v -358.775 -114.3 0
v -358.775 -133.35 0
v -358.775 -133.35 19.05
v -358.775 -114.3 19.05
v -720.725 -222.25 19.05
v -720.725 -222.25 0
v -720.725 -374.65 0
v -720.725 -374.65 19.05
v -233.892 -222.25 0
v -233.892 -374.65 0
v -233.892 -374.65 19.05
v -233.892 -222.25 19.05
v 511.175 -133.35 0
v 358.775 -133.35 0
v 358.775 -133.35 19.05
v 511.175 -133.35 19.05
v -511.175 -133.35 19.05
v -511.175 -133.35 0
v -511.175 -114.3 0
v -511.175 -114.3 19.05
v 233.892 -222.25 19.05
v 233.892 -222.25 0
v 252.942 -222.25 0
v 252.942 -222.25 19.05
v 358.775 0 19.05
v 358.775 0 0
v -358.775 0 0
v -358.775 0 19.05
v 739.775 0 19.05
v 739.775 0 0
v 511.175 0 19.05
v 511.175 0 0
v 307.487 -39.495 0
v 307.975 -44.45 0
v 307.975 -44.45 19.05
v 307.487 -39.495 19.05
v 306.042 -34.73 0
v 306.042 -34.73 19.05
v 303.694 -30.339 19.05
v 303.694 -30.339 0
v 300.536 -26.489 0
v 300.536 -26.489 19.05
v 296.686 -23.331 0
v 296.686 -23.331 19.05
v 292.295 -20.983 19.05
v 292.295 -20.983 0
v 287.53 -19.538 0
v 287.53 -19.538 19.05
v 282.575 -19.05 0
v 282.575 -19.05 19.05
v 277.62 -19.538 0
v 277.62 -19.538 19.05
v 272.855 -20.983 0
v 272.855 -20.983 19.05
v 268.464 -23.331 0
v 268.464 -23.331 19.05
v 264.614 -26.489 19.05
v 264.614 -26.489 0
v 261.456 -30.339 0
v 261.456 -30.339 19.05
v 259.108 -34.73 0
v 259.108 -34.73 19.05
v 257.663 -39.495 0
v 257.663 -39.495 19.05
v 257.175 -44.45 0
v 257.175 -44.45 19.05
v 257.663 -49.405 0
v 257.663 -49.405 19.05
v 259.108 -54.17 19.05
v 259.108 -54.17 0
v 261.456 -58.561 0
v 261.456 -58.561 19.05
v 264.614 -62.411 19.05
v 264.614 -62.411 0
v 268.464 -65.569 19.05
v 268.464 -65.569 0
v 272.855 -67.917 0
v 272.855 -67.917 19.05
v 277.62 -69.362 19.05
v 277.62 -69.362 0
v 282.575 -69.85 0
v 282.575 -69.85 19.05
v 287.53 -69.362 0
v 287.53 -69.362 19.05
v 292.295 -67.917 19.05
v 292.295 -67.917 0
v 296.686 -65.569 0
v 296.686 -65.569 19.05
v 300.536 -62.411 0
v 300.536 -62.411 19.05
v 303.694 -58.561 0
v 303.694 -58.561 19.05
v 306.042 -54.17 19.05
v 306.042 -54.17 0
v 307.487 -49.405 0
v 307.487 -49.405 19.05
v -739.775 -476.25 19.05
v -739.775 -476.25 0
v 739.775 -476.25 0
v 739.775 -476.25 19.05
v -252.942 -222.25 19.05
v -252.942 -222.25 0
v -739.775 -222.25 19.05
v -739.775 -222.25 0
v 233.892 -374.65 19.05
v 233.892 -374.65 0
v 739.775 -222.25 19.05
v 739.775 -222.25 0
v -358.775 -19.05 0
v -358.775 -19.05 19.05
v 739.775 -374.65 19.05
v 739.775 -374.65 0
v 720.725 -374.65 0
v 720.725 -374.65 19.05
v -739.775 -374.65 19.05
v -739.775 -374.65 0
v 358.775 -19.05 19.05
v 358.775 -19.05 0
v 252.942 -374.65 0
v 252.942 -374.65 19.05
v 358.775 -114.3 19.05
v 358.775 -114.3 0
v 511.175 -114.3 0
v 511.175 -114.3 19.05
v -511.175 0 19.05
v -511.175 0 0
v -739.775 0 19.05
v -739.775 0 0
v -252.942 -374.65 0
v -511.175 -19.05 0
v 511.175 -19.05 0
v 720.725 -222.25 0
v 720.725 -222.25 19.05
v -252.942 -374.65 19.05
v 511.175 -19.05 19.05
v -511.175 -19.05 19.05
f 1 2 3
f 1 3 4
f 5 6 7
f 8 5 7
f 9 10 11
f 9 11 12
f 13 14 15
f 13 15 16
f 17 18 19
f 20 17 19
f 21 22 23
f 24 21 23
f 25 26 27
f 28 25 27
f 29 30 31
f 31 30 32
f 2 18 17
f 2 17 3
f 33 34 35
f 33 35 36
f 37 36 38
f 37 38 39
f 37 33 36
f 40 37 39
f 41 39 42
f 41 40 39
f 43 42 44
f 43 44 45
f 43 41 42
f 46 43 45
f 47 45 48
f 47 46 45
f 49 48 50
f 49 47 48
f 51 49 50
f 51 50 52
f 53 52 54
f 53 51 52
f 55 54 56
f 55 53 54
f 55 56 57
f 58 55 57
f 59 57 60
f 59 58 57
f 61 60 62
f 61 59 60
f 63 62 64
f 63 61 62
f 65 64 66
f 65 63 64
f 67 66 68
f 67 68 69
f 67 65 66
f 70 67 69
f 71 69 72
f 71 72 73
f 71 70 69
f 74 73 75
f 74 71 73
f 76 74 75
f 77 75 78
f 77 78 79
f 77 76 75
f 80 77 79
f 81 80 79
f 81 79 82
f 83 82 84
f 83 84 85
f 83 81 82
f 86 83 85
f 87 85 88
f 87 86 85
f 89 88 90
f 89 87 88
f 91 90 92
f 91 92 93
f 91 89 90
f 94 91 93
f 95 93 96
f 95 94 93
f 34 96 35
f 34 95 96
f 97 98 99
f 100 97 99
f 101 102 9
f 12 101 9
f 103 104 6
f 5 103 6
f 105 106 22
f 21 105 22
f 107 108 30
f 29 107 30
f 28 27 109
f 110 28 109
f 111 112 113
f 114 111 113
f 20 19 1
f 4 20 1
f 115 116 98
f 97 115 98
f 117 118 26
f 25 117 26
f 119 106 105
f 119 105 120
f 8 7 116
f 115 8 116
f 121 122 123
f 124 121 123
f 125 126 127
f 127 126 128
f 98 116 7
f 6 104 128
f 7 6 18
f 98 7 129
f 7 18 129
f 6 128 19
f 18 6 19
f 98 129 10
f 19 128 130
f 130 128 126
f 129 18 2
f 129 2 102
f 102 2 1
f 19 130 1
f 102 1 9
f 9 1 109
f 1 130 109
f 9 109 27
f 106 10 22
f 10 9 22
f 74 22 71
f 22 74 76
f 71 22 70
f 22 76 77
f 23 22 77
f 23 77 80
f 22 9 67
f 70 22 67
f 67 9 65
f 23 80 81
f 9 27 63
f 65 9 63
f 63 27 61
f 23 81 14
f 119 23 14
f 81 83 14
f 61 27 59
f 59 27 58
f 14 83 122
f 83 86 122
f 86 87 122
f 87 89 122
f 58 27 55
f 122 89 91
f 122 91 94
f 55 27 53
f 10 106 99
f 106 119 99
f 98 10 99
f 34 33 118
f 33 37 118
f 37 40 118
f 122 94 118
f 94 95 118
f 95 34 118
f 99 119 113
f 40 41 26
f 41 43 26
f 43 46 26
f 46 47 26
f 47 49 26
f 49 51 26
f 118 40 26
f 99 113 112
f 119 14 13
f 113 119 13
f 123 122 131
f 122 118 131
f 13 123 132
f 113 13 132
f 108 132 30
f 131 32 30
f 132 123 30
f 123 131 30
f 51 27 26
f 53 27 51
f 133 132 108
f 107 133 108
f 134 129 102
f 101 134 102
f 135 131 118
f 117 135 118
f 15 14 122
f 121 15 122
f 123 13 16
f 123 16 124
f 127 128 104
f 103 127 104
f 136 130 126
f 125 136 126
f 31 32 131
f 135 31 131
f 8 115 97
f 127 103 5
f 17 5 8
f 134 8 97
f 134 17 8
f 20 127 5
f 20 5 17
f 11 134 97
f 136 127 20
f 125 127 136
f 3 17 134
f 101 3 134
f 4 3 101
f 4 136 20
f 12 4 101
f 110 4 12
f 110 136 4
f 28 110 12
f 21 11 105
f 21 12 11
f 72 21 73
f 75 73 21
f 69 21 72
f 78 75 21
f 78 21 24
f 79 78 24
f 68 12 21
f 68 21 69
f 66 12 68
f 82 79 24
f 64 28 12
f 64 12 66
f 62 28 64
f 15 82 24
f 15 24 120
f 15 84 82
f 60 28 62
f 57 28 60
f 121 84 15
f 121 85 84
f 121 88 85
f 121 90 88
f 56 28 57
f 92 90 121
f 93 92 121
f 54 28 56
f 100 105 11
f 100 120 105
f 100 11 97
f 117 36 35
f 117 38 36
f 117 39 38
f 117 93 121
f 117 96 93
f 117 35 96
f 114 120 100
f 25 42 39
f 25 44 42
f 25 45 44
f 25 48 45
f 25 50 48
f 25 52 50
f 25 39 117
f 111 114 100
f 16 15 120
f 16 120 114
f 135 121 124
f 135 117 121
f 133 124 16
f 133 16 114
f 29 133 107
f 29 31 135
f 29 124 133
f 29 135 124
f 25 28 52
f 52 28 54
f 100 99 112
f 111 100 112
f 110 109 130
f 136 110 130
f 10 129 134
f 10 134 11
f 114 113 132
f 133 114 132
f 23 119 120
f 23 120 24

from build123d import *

# Parameters (mm, degrees)
F0_W     = 19.05
F0_H     = 152.4
F0_W_2   = 152.4
F0_H_2   = 19.05
F0_R     = 25.4
F1_DEPTH = 19.05


with BuildPart() as f1:
    # F0 (on Top) → F1 (new body)
    with BuildSketch(Plane.XY):
        Polygon((-511.175, 0), (-739.775, 0), (-739.775, -222.25), (-720.725, -222.25), (-720.725, -374.65), (-739.775, -374.65), (-739.775, -476.25), (739.775, -476.25), (739.775, -374.65), (720.725, -374.65), (720.725, -222.25), (739.775, -222.25), (739.775, -95.25), (739.775, 0), (511.175, 0), (511.175, -19.05), (358.775, -19.05), (358.775, 0), (-358.775, 0), (-358.775, -19.05), (-511.175, -19.05), align=None)
        with Locations((-243.416667, -298.45)):
            Rectangle(F0_W, F0_H, mode=Mode.SUBTRACT)
        with Locations((243.416667, -298.45)):
            Rectangle(F0_W, F0_H, mode=Mode.SUBTRACT)
        with Locations((-434.975, -123.825)):
            Rectangle(F0_W_2, F0_H_2, mode=Mode.SUBTRACT)
        with Locations((434.975, -123.825)):
            Rectangle(F0_W_2, F0_H_2, mode=Mode.SUBTRACT)
        with Locations((282.575, -44.45)):
            Circle(F0_R, mode=Mode.SUBTRACT)
    extrude(amount=F1_DEPTH)


solid = f1.part
